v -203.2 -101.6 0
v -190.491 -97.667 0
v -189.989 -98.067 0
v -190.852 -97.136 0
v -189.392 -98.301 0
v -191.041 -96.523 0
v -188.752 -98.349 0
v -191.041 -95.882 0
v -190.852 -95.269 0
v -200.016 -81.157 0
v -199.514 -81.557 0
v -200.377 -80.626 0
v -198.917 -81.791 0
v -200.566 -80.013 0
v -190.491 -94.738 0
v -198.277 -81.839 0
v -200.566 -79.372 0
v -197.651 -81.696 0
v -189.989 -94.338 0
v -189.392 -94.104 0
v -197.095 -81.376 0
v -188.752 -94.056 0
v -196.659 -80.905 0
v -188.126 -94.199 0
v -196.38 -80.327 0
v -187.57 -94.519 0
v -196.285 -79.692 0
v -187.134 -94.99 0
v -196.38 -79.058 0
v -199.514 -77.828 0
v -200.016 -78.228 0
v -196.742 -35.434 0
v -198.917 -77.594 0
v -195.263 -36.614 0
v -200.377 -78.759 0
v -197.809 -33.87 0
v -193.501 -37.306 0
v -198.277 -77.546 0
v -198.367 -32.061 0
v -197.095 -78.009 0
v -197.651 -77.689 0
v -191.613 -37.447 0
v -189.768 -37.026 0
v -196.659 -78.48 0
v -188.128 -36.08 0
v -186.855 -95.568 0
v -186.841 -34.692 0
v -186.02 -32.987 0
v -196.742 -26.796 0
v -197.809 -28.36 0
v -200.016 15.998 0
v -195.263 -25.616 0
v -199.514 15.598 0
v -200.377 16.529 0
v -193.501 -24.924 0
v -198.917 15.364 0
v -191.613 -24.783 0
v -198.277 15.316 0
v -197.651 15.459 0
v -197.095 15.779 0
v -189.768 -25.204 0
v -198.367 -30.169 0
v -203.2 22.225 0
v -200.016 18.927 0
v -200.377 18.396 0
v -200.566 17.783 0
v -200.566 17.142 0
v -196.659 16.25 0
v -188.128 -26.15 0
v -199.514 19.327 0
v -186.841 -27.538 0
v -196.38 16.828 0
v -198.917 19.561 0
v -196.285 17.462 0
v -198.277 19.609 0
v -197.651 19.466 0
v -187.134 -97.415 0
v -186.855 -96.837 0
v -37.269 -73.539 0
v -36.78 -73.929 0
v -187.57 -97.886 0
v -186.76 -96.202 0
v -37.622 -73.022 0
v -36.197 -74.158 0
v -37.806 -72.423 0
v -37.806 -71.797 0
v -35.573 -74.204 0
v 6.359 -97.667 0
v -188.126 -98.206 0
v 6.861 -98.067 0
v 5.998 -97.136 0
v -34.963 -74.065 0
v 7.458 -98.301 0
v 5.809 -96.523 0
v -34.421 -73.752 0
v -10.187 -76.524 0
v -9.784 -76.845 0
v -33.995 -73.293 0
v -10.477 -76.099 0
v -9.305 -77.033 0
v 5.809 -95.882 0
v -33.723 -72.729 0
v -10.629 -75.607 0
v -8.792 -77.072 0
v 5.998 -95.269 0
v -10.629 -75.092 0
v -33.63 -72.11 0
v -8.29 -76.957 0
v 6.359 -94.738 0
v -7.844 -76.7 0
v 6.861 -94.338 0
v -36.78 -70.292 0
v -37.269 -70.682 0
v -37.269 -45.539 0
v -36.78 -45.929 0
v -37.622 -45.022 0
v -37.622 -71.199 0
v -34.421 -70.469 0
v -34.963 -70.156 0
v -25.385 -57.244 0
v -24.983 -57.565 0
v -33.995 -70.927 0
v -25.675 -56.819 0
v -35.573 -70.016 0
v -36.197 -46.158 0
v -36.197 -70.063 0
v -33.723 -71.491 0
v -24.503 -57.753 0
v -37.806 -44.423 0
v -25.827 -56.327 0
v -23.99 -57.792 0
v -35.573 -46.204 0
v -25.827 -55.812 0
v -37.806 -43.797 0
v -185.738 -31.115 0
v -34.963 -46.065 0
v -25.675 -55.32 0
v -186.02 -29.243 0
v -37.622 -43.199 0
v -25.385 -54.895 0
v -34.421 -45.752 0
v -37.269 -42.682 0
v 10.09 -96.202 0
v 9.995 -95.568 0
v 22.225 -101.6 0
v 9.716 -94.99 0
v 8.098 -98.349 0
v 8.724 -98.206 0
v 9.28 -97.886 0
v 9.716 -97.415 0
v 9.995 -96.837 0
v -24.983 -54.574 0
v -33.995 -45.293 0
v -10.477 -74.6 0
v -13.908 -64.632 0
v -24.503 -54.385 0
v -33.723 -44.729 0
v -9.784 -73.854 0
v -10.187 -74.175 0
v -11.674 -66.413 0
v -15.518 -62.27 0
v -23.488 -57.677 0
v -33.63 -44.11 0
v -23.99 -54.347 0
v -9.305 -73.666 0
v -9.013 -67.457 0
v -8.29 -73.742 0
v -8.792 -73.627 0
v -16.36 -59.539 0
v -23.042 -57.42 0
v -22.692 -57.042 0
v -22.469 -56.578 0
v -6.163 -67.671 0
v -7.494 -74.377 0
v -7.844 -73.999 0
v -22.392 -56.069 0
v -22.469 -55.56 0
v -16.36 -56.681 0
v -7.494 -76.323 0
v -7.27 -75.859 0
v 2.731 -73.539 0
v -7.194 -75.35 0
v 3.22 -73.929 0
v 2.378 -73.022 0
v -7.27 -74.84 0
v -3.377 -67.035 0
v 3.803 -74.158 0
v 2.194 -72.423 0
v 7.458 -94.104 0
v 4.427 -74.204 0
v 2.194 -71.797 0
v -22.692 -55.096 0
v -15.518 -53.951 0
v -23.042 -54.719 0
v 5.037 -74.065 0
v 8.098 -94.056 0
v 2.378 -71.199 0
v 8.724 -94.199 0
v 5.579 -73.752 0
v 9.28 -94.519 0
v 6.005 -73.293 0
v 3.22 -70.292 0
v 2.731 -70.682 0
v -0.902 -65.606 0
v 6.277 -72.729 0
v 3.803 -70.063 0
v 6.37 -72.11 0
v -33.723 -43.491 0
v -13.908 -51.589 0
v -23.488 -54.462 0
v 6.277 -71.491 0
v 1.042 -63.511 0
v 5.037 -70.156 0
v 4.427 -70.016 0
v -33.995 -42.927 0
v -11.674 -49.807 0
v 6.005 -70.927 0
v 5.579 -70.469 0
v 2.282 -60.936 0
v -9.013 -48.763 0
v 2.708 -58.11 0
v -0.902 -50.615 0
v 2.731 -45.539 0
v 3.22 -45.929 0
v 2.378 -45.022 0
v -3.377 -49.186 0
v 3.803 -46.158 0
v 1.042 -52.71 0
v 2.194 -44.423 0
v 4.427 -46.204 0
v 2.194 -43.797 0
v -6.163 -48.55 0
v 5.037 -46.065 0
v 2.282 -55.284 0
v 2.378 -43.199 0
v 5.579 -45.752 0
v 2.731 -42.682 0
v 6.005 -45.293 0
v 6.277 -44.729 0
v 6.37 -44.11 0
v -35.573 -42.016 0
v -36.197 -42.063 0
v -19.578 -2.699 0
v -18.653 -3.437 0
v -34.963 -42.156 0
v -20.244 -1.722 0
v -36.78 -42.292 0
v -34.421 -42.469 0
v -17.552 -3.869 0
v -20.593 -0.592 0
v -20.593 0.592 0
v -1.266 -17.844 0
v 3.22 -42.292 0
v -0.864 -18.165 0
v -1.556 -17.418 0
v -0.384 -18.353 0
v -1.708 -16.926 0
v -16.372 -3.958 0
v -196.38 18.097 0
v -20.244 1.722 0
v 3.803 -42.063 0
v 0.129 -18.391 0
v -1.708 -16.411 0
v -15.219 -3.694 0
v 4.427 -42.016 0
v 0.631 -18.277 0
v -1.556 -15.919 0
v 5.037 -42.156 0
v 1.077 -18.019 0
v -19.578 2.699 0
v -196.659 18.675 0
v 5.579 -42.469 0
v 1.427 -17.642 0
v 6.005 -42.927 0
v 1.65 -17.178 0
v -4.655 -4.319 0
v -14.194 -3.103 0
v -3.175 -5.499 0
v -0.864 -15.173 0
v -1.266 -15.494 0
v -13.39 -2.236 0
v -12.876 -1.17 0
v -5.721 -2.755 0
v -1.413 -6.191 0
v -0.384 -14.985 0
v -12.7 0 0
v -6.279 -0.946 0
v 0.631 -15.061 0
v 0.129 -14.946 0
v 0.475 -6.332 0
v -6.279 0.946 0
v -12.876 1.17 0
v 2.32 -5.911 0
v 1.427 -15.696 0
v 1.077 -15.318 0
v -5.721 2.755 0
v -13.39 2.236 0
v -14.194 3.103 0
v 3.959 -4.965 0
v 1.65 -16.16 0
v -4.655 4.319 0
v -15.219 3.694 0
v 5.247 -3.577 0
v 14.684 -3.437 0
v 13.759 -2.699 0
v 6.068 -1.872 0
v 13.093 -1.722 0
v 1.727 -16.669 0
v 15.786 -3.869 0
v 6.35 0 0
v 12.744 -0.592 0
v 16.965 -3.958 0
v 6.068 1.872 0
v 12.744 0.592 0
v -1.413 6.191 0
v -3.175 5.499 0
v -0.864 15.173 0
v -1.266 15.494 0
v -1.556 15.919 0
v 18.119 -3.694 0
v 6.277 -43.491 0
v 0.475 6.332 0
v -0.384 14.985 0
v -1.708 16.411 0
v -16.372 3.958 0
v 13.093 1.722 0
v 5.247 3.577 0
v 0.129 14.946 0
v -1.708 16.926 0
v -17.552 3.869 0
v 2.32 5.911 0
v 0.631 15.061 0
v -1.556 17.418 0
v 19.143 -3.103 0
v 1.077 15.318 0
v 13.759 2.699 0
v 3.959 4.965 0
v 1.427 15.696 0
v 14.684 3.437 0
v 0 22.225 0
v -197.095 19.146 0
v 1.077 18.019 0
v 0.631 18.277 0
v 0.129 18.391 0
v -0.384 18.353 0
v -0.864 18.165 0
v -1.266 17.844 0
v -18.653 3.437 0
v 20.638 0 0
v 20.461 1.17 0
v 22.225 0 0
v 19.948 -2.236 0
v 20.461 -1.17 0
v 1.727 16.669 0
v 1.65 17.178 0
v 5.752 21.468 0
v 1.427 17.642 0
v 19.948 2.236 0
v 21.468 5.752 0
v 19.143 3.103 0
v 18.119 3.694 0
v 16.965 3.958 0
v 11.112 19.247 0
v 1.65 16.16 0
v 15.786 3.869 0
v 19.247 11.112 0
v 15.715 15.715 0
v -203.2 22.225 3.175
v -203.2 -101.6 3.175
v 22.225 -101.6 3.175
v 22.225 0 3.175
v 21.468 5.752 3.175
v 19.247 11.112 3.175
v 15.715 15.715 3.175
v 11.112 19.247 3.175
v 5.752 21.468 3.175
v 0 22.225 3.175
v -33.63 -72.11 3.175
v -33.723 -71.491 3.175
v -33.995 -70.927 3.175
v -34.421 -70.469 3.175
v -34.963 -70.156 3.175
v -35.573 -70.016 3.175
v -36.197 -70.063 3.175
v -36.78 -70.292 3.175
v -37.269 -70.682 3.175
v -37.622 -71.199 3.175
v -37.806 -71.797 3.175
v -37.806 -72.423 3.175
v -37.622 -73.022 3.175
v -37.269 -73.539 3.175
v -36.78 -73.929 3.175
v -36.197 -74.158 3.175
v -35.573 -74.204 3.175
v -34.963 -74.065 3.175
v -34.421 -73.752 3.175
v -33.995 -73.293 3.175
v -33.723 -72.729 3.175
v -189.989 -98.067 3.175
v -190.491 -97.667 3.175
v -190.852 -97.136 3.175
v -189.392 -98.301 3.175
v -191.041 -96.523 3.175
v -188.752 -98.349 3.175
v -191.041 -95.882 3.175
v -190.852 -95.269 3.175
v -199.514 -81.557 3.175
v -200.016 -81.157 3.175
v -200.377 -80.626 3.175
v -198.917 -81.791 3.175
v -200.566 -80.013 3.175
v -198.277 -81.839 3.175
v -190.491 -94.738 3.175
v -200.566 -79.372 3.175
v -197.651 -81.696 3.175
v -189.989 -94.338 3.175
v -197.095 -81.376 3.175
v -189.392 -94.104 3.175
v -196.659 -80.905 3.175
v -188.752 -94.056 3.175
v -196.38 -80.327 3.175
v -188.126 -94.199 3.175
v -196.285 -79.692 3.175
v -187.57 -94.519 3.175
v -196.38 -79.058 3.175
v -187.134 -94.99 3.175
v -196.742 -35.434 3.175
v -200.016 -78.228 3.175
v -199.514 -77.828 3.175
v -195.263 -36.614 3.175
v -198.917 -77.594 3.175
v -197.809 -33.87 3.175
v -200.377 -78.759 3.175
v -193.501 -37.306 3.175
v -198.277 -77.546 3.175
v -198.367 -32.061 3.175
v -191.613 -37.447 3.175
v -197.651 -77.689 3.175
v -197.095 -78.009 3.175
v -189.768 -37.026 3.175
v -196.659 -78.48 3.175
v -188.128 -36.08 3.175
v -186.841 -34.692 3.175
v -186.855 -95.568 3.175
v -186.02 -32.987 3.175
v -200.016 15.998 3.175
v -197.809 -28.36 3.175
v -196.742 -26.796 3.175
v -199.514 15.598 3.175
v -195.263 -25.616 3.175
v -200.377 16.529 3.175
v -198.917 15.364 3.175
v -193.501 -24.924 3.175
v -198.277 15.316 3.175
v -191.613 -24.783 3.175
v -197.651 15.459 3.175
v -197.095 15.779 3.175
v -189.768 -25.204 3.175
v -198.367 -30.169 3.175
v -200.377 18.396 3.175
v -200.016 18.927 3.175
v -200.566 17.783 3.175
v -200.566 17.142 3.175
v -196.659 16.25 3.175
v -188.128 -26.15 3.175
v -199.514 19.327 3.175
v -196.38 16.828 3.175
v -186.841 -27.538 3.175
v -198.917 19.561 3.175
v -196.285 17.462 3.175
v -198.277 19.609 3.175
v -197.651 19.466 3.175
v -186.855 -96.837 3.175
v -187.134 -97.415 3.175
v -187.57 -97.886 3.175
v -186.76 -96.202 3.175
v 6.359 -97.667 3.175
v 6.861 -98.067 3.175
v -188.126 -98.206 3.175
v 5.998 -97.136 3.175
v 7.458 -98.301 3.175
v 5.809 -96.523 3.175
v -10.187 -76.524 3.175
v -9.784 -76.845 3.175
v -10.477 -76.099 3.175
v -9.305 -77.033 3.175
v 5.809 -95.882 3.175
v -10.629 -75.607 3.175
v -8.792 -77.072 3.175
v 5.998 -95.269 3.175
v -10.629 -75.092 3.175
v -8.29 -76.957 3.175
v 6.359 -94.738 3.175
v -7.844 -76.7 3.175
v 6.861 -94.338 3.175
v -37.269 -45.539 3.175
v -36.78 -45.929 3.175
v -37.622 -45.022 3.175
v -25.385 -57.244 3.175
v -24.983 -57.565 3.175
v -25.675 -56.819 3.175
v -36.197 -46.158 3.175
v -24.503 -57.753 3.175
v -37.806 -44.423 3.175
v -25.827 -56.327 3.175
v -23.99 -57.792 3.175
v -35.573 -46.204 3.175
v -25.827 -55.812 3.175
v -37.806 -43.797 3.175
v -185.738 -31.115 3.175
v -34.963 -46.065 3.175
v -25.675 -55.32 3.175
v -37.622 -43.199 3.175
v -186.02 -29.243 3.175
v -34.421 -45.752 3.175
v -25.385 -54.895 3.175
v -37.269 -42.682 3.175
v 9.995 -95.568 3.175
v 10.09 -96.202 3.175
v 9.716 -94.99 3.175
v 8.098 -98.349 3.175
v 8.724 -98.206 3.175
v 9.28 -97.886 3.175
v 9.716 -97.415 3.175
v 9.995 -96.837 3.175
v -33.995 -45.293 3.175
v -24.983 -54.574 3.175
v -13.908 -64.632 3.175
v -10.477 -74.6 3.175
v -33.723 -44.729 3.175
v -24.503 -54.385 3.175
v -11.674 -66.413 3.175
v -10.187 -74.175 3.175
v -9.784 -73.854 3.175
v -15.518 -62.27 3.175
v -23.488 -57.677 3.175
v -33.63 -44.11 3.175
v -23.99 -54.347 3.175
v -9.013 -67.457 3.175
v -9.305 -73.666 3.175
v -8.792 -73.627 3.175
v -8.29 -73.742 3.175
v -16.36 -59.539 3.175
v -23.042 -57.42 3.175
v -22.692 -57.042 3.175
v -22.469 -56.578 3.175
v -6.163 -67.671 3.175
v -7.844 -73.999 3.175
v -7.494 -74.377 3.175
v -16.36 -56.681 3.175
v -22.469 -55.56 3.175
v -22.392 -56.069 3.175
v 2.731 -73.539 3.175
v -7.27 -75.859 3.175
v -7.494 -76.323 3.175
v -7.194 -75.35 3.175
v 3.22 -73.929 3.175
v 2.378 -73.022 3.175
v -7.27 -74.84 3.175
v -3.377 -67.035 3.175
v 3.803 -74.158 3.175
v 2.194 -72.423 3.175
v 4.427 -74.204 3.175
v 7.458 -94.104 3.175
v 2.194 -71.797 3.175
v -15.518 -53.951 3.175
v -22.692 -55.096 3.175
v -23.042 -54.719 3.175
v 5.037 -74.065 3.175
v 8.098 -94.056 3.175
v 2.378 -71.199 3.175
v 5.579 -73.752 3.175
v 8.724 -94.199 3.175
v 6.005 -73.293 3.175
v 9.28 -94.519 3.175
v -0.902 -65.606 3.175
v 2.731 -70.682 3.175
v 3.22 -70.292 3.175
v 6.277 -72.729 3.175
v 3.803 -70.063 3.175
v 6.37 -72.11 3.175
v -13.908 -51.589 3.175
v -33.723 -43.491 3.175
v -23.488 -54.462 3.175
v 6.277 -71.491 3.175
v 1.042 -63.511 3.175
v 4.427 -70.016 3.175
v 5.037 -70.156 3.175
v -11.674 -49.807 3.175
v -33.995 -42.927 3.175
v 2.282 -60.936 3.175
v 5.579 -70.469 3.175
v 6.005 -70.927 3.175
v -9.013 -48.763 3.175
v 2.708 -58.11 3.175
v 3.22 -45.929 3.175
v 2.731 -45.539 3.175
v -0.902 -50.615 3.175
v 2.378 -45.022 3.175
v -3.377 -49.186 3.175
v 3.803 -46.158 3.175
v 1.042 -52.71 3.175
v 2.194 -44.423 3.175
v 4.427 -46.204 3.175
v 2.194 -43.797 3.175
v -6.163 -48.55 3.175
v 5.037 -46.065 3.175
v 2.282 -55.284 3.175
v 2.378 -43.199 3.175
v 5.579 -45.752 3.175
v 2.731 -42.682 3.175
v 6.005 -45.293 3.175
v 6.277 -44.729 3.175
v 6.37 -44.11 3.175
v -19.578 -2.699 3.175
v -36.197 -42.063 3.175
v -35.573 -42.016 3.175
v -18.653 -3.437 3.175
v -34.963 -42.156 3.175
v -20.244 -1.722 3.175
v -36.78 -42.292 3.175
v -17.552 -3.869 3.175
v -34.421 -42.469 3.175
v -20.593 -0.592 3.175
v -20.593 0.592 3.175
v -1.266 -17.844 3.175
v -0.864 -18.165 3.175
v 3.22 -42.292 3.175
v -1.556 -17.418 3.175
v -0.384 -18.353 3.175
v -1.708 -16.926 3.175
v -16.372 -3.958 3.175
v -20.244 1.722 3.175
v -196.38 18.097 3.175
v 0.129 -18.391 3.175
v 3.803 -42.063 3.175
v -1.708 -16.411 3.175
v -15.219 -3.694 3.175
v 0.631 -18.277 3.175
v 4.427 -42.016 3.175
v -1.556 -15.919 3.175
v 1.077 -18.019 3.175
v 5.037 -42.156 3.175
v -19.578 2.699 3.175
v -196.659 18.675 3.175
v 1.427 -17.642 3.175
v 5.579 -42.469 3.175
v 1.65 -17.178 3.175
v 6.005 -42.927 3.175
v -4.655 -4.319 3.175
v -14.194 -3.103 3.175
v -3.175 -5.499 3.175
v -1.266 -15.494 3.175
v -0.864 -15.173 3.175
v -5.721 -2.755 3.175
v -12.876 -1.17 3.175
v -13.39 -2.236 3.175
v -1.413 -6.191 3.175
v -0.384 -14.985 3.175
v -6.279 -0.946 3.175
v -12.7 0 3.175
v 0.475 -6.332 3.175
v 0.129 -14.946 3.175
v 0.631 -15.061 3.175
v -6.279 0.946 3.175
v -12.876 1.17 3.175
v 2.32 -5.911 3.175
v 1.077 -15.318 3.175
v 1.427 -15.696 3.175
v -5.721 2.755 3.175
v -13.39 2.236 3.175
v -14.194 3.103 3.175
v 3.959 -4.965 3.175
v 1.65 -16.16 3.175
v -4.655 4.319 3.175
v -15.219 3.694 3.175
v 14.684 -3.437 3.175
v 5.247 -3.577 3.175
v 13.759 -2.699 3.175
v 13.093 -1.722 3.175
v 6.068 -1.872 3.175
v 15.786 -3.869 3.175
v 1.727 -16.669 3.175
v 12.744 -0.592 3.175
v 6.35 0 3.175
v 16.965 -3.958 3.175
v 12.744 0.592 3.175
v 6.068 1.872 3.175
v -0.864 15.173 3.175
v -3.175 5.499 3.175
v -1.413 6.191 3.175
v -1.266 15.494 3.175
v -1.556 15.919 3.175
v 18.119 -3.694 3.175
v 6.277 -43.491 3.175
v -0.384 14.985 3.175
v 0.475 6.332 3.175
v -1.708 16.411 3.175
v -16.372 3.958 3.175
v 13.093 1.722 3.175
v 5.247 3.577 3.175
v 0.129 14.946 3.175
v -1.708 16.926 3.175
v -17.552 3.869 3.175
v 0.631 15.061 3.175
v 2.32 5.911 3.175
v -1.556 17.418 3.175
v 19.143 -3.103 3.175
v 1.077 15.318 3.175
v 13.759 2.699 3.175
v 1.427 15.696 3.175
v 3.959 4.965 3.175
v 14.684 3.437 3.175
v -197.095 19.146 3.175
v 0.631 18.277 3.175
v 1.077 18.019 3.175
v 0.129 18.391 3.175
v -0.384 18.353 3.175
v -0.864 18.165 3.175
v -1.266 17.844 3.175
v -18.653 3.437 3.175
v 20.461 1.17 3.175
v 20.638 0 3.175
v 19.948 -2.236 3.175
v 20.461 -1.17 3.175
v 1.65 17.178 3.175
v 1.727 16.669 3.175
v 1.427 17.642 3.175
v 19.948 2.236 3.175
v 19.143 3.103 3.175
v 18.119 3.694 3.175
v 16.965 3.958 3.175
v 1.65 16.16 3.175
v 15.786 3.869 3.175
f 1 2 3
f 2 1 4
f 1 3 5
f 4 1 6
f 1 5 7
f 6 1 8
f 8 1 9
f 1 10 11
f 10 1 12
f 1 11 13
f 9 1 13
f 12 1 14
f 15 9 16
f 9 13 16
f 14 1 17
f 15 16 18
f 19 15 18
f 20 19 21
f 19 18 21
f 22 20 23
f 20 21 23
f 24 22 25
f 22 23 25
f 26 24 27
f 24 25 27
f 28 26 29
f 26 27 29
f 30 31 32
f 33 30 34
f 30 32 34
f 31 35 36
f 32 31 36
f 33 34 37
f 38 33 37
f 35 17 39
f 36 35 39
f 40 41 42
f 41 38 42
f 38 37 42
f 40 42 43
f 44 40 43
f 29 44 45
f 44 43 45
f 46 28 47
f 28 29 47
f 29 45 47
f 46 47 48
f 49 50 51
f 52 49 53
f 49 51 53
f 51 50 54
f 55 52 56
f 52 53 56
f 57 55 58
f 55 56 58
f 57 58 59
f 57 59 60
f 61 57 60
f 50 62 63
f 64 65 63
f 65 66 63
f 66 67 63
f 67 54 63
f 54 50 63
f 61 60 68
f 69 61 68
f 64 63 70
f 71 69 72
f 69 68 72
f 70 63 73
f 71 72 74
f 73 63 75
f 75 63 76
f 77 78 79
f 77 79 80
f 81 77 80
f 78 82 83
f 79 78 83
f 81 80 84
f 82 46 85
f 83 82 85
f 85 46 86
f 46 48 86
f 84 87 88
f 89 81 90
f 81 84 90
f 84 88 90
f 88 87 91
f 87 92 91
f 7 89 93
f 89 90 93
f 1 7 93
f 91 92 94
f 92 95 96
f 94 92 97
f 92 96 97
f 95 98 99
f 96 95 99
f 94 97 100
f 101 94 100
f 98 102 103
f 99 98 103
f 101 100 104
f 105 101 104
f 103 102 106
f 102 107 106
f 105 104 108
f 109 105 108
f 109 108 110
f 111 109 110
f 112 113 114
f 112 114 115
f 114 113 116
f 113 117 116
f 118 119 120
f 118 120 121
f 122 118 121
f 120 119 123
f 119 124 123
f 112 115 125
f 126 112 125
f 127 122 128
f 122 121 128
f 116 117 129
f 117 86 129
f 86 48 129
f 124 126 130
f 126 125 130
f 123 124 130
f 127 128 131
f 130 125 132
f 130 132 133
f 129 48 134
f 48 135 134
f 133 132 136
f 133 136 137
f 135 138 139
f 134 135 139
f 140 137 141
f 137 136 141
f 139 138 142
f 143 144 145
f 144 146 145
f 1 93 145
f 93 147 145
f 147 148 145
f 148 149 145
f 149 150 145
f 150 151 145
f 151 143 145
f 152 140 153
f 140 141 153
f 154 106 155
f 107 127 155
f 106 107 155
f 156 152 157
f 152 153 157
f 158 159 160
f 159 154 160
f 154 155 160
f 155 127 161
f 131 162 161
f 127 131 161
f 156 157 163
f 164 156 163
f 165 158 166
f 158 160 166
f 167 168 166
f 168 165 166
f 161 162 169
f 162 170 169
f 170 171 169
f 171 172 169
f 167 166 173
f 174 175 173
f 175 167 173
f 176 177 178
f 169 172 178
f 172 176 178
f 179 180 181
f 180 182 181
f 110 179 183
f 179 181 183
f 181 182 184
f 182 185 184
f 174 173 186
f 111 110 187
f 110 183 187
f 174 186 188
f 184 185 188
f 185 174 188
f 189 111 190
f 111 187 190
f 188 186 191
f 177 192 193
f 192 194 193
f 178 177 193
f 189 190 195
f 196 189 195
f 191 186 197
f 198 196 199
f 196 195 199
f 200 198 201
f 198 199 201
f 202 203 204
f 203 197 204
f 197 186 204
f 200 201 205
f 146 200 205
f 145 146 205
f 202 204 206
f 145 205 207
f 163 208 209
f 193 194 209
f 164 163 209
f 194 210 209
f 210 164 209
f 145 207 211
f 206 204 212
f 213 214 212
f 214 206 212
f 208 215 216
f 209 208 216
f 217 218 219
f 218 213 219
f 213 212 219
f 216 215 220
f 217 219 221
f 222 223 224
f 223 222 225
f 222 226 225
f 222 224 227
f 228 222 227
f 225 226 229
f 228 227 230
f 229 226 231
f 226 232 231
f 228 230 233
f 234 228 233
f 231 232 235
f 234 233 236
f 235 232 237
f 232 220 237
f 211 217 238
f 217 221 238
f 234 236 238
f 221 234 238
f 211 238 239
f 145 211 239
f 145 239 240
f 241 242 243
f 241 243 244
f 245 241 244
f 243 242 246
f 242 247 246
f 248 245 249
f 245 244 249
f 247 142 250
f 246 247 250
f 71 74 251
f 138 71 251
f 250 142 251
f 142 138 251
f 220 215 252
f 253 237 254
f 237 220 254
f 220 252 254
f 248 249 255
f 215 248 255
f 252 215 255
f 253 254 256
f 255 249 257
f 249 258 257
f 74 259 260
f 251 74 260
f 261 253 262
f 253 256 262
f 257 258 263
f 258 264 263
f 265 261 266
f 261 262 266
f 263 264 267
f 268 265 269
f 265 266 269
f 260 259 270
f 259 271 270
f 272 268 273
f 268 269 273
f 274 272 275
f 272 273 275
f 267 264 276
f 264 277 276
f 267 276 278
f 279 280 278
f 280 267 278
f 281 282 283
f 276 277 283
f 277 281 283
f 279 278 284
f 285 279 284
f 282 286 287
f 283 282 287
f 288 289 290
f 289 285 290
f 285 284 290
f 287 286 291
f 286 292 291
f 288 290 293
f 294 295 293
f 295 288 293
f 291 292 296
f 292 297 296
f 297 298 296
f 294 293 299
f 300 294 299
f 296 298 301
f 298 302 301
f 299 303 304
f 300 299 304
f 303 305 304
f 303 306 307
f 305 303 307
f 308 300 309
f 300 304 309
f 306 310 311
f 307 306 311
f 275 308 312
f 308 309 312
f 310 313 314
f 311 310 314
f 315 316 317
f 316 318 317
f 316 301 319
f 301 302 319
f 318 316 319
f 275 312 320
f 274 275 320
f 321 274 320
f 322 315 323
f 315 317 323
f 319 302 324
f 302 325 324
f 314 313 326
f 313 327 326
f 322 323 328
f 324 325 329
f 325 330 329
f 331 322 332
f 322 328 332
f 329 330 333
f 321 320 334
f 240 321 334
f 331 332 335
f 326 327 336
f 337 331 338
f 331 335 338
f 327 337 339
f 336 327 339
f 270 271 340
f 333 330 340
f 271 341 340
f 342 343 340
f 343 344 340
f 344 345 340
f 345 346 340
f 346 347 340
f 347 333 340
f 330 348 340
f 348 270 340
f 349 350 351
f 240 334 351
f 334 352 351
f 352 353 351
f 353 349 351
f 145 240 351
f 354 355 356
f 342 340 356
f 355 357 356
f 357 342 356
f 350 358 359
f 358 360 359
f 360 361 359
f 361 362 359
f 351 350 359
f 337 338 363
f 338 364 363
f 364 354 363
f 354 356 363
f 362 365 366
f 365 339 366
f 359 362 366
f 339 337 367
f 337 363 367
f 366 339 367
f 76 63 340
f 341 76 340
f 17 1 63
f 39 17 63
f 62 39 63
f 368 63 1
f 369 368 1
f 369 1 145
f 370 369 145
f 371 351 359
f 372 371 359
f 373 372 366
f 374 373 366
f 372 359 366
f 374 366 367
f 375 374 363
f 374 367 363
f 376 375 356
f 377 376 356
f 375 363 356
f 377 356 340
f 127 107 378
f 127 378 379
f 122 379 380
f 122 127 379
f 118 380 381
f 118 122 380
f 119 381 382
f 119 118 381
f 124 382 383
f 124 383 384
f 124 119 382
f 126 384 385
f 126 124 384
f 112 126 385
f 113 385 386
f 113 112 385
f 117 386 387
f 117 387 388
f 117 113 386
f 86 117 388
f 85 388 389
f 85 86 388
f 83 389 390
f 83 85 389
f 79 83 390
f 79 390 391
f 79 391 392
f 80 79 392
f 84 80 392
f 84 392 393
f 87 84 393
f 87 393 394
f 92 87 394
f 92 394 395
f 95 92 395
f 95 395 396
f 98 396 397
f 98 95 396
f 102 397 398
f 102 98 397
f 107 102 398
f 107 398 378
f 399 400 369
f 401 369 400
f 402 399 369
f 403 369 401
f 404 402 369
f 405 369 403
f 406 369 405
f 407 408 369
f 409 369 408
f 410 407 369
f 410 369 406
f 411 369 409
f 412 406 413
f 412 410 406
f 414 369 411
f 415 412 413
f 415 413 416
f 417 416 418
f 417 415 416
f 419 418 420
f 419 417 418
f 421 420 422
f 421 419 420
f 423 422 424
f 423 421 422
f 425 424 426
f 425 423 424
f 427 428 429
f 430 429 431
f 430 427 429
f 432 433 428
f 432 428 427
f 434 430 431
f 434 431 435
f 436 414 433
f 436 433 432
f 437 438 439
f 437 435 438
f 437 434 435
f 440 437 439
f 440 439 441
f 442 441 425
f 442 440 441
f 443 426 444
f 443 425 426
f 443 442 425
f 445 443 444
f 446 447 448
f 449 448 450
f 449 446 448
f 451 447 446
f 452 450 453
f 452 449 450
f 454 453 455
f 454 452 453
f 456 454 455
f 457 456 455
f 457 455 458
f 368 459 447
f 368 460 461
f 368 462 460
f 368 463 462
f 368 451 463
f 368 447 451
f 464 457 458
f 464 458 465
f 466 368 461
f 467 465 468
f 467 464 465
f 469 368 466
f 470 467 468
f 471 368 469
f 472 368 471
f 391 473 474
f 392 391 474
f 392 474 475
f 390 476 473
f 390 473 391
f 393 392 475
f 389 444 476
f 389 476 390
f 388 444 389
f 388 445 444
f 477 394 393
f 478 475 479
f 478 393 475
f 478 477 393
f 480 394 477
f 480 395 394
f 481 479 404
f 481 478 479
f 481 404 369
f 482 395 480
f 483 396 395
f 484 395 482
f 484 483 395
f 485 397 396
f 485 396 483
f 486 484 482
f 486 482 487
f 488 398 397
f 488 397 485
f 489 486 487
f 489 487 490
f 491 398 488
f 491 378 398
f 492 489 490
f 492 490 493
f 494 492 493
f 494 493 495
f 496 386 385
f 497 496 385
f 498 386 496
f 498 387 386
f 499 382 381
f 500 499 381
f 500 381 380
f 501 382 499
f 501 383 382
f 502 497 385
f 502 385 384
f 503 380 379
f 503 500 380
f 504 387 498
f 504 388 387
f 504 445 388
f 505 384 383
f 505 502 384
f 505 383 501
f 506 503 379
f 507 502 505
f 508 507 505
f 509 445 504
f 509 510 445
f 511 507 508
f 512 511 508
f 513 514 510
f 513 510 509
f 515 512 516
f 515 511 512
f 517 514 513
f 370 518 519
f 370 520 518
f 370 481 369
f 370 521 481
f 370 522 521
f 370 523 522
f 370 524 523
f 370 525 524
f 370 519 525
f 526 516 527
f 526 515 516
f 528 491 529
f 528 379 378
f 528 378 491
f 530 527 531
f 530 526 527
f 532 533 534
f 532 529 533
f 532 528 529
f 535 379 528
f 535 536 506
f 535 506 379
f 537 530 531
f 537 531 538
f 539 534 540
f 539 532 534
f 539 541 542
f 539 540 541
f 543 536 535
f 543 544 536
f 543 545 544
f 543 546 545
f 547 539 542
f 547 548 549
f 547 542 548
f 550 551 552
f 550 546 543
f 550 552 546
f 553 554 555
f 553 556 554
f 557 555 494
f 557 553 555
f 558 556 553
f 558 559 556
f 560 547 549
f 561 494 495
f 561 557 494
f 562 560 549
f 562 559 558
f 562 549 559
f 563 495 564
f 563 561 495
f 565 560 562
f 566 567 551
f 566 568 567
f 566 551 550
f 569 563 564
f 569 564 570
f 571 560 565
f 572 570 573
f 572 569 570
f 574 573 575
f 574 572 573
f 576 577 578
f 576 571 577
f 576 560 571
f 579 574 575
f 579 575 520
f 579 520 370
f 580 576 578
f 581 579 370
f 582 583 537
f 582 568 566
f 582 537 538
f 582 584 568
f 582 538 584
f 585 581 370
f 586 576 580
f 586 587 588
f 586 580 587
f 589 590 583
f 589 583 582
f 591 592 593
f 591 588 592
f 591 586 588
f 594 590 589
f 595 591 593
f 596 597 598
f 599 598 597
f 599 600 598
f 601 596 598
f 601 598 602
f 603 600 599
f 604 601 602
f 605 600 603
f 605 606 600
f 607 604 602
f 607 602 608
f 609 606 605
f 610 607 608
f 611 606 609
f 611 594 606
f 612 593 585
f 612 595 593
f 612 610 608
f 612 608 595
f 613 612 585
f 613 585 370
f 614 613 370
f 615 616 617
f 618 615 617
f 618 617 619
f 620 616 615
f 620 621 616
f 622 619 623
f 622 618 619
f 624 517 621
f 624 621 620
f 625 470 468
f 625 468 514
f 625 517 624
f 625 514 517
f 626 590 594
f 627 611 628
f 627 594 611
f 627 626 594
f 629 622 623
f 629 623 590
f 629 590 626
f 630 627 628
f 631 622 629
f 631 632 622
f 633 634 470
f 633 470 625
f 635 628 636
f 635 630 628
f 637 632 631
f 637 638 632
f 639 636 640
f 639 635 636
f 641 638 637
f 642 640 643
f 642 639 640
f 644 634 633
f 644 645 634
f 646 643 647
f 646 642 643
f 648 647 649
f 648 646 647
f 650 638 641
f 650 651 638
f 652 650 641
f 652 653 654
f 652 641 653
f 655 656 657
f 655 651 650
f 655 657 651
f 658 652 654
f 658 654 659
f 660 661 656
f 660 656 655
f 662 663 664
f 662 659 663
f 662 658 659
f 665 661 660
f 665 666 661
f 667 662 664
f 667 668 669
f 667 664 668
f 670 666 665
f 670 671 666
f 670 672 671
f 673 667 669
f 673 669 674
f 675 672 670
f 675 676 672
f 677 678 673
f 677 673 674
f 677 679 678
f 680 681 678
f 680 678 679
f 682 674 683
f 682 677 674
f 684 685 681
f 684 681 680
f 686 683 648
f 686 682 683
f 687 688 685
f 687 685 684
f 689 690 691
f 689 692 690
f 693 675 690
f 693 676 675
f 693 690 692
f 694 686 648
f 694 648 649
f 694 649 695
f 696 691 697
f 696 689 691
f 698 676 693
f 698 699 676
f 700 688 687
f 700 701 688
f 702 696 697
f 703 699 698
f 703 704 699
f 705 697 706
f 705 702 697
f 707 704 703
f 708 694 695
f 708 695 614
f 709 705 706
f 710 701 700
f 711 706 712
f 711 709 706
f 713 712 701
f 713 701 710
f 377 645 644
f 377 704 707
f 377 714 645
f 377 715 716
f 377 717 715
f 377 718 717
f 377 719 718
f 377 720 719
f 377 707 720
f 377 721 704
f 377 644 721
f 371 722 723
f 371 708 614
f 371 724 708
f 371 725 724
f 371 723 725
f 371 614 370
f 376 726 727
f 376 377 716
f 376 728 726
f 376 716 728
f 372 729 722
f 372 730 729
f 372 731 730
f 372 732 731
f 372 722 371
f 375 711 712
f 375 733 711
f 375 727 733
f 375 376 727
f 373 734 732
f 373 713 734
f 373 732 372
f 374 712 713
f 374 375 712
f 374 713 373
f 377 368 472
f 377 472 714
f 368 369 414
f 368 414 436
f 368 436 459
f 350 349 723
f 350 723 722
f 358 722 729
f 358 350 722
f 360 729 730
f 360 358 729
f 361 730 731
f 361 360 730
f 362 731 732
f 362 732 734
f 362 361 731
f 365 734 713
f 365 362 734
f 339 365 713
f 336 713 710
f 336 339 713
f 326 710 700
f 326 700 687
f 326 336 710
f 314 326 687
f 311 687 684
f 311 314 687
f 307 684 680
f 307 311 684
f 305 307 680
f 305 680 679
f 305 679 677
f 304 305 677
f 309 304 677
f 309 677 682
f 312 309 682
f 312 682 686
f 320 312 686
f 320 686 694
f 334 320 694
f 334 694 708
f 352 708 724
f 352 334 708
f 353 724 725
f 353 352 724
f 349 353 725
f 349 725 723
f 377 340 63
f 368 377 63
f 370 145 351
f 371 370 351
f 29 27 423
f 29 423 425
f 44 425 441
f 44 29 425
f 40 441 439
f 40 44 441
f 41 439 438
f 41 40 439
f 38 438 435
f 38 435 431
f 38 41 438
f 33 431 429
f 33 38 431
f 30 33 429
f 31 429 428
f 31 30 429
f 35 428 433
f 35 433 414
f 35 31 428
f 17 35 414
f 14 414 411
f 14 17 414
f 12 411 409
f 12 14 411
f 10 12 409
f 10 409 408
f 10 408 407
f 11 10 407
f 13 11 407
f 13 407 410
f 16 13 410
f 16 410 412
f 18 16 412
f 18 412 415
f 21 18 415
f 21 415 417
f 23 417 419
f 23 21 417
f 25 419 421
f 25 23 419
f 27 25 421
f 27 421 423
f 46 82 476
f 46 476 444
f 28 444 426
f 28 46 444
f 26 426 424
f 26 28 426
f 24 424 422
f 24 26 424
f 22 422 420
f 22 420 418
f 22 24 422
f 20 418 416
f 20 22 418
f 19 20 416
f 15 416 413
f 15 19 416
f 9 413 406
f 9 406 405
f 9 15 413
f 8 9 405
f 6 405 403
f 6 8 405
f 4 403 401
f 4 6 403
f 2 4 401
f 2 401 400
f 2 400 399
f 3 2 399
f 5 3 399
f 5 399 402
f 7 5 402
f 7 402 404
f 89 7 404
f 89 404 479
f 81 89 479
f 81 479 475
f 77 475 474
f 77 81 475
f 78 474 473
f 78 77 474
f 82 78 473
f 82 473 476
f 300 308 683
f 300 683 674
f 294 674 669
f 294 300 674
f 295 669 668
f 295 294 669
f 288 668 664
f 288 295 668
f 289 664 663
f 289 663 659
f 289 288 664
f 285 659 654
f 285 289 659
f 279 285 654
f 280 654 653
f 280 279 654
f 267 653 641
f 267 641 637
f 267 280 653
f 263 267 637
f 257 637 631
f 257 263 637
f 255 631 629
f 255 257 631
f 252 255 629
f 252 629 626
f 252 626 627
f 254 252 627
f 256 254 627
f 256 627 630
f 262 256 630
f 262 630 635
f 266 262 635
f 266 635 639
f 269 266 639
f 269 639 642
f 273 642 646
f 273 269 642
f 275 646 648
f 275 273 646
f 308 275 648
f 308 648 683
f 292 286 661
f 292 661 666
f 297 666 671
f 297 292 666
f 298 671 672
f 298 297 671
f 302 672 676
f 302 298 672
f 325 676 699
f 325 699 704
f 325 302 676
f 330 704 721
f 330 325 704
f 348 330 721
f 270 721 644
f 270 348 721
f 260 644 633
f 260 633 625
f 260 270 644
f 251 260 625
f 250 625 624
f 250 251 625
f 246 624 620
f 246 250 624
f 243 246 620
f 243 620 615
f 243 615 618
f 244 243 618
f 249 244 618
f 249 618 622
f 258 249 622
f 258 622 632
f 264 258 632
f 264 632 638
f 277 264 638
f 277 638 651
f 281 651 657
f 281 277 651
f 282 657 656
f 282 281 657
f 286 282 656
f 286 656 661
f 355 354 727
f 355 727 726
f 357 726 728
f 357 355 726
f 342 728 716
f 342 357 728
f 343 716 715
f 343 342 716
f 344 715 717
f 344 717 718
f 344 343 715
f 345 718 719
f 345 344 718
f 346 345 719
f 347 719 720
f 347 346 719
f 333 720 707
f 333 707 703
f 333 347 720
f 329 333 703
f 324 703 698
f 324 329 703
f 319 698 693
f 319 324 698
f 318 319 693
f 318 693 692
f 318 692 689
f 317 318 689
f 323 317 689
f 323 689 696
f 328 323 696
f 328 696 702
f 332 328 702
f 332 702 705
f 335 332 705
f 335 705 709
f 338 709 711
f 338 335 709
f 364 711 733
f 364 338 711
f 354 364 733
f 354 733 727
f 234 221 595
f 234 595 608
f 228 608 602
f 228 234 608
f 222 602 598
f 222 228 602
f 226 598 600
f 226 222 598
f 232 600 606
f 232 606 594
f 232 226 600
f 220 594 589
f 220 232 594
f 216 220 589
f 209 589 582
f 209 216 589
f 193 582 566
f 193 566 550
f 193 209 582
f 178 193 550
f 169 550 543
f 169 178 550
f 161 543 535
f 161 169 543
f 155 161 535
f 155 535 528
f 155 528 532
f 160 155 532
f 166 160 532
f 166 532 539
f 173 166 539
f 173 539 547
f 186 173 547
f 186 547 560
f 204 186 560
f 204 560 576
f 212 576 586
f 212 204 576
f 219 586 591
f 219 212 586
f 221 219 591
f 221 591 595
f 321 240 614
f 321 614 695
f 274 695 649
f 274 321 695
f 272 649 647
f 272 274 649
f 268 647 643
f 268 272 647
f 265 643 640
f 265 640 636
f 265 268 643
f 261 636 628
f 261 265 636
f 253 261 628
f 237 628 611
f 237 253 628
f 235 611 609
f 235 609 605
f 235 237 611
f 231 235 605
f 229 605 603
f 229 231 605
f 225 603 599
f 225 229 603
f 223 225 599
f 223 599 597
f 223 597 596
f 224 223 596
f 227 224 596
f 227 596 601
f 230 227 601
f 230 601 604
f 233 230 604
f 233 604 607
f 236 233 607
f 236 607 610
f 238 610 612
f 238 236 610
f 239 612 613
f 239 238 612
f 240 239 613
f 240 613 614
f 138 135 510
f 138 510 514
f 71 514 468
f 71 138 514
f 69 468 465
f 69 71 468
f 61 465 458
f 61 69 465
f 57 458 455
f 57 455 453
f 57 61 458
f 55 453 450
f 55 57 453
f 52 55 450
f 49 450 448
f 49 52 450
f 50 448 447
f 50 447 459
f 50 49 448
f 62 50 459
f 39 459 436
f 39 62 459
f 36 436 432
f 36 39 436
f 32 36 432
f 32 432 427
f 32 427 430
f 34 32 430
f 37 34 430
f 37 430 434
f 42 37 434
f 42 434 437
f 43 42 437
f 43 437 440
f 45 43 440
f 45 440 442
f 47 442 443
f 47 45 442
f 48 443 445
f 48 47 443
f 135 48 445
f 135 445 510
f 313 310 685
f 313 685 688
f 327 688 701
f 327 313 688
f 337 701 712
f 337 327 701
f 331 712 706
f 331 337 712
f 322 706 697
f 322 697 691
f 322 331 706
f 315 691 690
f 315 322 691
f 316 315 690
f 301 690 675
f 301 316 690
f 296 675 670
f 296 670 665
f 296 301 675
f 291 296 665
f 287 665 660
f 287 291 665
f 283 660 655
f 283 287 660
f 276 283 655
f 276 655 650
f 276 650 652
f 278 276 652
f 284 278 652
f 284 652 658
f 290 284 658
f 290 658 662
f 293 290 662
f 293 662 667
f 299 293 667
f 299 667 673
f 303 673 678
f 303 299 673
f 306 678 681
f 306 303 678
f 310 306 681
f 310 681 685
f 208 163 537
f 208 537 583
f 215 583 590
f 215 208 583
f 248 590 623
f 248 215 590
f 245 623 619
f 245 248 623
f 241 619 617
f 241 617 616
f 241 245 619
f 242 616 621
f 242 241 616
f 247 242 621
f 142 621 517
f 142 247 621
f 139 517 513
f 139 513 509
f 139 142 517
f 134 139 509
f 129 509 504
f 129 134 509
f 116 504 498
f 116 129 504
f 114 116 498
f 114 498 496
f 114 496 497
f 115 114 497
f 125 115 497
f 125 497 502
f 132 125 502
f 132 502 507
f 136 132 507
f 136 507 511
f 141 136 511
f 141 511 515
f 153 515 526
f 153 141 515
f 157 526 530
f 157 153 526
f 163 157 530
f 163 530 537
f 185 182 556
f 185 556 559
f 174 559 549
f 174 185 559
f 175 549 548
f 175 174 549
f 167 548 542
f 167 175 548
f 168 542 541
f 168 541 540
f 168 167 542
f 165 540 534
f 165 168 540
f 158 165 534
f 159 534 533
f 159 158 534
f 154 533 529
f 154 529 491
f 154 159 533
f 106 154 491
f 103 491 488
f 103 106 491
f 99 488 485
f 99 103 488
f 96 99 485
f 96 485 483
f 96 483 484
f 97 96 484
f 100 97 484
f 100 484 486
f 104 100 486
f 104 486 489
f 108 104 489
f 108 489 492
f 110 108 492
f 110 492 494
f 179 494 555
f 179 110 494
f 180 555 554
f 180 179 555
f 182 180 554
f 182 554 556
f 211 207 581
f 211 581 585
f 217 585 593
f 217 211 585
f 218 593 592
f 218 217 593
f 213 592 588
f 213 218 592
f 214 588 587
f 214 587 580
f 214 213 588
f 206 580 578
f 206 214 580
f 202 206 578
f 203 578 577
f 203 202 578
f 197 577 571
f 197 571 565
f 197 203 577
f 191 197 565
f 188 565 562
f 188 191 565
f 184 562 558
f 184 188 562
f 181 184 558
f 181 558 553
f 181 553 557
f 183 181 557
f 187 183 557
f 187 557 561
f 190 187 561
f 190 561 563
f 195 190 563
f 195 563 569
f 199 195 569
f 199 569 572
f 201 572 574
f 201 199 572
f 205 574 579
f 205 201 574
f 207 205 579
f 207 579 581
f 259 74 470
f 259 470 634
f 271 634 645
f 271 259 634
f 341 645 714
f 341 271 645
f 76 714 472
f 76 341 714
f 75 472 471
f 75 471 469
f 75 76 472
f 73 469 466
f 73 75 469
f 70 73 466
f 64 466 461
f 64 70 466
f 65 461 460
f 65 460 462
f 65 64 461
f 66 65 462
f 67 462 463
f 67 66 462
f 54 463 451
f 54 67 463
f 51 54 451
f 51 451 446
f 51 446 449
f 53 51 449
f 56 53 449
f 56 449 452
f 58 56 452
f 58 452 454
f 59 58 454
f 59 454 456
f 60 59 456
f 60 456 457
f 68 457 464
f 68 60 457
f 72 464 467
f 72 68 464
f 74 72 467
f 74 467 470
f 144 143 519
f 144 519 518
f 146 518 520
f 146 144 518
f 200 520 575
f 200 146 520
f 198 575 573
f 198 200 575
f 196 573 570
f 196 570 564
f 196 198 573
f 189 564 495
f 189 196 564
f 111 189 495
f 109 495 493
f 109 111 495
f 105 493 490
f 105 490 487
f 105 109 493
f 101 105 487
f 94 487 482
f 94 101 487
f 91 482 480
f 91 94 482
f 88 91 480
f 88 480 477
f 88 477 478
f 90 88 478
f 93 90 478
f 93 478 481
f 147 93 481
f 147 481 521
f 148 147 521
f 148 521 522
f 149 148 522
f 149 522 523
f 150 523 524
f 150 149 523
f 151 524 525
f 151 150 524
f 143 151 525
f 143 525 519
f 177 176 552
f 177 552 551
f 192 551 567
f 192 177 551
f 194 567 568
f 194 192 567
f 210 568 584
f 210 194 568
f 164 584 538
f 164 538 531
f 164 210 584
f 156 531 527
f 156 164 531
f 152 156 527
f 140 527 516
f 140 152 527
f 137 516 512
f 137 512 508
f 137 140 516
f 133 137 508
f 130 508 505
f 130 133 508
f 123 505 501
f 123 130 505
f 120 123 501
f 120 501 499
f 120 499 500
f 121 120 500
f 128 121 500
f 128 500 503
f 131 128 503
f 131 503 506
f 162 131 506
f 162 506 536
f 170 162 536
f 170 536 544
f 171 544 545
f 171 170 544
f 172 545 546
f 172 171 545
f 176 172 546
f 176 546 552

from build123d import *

# Parameters (mm, degrees)
F0_R     = 2.15265
F0_R_2   = 2.1
F0_R_3   = 1.7272
F0_R_4   = 9.587497
F0_R_5   = 6.35
F0_R_6   = 3.96875
F1_DEPTH = 3.175


with BuildPart() as f1:
    # F0 (on Top) → F1 (new body)
    with BuildSketch(Plane.XY):
        with BuildLine():
            Line((0, 22.225), (-203.2, 22.225))
            Line((-203.2, 22.225), (-203.2, -101.6))
            Line((-203.2, -101.6), (22.225, -101.6))
            Line((22.225, -101.6), (22.225, -90.805))
            Line((22.225, -90.805), (22.225, 0))
            ThreePointArc((22.225, 0), (15.715448, 15.715448), (0, 22.225))
        make_face()
        with Locations((-188.9125, -96.2025)):
            Circle(F0_R, mode=Mode.SUBTRACT)
        with Locations((-198.4375, -79.6925)):
            Circle(F0_R, mode=Mode.SUBTRACT)
        with Locations((-35.729847, -72.110361)):
            Circle(F0_R_2, mode=Mode.SUBTRACT)
        with Locations((7.9375, -96.2025)):
            Circle(F0_R, mode=Mode.SUBTRACT)
        with Locations((-8.920831, -75.349563)):
            Circle(F0_R_3, mode=Mode.SUBTRACT)
        with Locations((4.270153, -72.110361)):
            Circle(F0_R_2, mode=Mode.SUBTRACT)
        with Locations((-35.729847, -44.110361)):
            Circle(F0_R_2, mode=Mode.SUBTRACT)
        with Locations((-24.119039, -56.069367)):
            Circle(F0_R_3, mode=Mode.SUBTRACT)
        with Locations((-6.879837, -58.110361)):
            Circle(F0_R_4, mode=Mode.SUBTRACT)
        with Locations((4.270153, -44.110361)):
            Circle(F0_R_2, mode=Mode.SUBTRACT)
        with Locations((-192.0875, -31.115)):
            Circle(F0_R_5, mode=Mode.SUBTRACT)
        with Locations((-198.4375, 17.4625)):
            Circle(F0_R, mode=Mode.SUBTRACT)
        with Locations((0, -16.66875)):
            Circle(F0_R_3, mode=Mode.SUBTRACT)
        with Locations((-16.66875, 0)):
            Circle(F0_R_6, mode=Mode.SUBTRACT)
        Circle(F0_R_5, mode=Mode.SUBTRACT)
        with Locations((16.66875, 0)):
            Circle(F0_R_6, mode=Mode.SUBTRACT)
        with Locations((0, 16.66875)):
            Circle(F0_R_3, mode=Mode.SUBTRACT)
    extrude(amount=F1_DEPTH)


solid = f1.part
